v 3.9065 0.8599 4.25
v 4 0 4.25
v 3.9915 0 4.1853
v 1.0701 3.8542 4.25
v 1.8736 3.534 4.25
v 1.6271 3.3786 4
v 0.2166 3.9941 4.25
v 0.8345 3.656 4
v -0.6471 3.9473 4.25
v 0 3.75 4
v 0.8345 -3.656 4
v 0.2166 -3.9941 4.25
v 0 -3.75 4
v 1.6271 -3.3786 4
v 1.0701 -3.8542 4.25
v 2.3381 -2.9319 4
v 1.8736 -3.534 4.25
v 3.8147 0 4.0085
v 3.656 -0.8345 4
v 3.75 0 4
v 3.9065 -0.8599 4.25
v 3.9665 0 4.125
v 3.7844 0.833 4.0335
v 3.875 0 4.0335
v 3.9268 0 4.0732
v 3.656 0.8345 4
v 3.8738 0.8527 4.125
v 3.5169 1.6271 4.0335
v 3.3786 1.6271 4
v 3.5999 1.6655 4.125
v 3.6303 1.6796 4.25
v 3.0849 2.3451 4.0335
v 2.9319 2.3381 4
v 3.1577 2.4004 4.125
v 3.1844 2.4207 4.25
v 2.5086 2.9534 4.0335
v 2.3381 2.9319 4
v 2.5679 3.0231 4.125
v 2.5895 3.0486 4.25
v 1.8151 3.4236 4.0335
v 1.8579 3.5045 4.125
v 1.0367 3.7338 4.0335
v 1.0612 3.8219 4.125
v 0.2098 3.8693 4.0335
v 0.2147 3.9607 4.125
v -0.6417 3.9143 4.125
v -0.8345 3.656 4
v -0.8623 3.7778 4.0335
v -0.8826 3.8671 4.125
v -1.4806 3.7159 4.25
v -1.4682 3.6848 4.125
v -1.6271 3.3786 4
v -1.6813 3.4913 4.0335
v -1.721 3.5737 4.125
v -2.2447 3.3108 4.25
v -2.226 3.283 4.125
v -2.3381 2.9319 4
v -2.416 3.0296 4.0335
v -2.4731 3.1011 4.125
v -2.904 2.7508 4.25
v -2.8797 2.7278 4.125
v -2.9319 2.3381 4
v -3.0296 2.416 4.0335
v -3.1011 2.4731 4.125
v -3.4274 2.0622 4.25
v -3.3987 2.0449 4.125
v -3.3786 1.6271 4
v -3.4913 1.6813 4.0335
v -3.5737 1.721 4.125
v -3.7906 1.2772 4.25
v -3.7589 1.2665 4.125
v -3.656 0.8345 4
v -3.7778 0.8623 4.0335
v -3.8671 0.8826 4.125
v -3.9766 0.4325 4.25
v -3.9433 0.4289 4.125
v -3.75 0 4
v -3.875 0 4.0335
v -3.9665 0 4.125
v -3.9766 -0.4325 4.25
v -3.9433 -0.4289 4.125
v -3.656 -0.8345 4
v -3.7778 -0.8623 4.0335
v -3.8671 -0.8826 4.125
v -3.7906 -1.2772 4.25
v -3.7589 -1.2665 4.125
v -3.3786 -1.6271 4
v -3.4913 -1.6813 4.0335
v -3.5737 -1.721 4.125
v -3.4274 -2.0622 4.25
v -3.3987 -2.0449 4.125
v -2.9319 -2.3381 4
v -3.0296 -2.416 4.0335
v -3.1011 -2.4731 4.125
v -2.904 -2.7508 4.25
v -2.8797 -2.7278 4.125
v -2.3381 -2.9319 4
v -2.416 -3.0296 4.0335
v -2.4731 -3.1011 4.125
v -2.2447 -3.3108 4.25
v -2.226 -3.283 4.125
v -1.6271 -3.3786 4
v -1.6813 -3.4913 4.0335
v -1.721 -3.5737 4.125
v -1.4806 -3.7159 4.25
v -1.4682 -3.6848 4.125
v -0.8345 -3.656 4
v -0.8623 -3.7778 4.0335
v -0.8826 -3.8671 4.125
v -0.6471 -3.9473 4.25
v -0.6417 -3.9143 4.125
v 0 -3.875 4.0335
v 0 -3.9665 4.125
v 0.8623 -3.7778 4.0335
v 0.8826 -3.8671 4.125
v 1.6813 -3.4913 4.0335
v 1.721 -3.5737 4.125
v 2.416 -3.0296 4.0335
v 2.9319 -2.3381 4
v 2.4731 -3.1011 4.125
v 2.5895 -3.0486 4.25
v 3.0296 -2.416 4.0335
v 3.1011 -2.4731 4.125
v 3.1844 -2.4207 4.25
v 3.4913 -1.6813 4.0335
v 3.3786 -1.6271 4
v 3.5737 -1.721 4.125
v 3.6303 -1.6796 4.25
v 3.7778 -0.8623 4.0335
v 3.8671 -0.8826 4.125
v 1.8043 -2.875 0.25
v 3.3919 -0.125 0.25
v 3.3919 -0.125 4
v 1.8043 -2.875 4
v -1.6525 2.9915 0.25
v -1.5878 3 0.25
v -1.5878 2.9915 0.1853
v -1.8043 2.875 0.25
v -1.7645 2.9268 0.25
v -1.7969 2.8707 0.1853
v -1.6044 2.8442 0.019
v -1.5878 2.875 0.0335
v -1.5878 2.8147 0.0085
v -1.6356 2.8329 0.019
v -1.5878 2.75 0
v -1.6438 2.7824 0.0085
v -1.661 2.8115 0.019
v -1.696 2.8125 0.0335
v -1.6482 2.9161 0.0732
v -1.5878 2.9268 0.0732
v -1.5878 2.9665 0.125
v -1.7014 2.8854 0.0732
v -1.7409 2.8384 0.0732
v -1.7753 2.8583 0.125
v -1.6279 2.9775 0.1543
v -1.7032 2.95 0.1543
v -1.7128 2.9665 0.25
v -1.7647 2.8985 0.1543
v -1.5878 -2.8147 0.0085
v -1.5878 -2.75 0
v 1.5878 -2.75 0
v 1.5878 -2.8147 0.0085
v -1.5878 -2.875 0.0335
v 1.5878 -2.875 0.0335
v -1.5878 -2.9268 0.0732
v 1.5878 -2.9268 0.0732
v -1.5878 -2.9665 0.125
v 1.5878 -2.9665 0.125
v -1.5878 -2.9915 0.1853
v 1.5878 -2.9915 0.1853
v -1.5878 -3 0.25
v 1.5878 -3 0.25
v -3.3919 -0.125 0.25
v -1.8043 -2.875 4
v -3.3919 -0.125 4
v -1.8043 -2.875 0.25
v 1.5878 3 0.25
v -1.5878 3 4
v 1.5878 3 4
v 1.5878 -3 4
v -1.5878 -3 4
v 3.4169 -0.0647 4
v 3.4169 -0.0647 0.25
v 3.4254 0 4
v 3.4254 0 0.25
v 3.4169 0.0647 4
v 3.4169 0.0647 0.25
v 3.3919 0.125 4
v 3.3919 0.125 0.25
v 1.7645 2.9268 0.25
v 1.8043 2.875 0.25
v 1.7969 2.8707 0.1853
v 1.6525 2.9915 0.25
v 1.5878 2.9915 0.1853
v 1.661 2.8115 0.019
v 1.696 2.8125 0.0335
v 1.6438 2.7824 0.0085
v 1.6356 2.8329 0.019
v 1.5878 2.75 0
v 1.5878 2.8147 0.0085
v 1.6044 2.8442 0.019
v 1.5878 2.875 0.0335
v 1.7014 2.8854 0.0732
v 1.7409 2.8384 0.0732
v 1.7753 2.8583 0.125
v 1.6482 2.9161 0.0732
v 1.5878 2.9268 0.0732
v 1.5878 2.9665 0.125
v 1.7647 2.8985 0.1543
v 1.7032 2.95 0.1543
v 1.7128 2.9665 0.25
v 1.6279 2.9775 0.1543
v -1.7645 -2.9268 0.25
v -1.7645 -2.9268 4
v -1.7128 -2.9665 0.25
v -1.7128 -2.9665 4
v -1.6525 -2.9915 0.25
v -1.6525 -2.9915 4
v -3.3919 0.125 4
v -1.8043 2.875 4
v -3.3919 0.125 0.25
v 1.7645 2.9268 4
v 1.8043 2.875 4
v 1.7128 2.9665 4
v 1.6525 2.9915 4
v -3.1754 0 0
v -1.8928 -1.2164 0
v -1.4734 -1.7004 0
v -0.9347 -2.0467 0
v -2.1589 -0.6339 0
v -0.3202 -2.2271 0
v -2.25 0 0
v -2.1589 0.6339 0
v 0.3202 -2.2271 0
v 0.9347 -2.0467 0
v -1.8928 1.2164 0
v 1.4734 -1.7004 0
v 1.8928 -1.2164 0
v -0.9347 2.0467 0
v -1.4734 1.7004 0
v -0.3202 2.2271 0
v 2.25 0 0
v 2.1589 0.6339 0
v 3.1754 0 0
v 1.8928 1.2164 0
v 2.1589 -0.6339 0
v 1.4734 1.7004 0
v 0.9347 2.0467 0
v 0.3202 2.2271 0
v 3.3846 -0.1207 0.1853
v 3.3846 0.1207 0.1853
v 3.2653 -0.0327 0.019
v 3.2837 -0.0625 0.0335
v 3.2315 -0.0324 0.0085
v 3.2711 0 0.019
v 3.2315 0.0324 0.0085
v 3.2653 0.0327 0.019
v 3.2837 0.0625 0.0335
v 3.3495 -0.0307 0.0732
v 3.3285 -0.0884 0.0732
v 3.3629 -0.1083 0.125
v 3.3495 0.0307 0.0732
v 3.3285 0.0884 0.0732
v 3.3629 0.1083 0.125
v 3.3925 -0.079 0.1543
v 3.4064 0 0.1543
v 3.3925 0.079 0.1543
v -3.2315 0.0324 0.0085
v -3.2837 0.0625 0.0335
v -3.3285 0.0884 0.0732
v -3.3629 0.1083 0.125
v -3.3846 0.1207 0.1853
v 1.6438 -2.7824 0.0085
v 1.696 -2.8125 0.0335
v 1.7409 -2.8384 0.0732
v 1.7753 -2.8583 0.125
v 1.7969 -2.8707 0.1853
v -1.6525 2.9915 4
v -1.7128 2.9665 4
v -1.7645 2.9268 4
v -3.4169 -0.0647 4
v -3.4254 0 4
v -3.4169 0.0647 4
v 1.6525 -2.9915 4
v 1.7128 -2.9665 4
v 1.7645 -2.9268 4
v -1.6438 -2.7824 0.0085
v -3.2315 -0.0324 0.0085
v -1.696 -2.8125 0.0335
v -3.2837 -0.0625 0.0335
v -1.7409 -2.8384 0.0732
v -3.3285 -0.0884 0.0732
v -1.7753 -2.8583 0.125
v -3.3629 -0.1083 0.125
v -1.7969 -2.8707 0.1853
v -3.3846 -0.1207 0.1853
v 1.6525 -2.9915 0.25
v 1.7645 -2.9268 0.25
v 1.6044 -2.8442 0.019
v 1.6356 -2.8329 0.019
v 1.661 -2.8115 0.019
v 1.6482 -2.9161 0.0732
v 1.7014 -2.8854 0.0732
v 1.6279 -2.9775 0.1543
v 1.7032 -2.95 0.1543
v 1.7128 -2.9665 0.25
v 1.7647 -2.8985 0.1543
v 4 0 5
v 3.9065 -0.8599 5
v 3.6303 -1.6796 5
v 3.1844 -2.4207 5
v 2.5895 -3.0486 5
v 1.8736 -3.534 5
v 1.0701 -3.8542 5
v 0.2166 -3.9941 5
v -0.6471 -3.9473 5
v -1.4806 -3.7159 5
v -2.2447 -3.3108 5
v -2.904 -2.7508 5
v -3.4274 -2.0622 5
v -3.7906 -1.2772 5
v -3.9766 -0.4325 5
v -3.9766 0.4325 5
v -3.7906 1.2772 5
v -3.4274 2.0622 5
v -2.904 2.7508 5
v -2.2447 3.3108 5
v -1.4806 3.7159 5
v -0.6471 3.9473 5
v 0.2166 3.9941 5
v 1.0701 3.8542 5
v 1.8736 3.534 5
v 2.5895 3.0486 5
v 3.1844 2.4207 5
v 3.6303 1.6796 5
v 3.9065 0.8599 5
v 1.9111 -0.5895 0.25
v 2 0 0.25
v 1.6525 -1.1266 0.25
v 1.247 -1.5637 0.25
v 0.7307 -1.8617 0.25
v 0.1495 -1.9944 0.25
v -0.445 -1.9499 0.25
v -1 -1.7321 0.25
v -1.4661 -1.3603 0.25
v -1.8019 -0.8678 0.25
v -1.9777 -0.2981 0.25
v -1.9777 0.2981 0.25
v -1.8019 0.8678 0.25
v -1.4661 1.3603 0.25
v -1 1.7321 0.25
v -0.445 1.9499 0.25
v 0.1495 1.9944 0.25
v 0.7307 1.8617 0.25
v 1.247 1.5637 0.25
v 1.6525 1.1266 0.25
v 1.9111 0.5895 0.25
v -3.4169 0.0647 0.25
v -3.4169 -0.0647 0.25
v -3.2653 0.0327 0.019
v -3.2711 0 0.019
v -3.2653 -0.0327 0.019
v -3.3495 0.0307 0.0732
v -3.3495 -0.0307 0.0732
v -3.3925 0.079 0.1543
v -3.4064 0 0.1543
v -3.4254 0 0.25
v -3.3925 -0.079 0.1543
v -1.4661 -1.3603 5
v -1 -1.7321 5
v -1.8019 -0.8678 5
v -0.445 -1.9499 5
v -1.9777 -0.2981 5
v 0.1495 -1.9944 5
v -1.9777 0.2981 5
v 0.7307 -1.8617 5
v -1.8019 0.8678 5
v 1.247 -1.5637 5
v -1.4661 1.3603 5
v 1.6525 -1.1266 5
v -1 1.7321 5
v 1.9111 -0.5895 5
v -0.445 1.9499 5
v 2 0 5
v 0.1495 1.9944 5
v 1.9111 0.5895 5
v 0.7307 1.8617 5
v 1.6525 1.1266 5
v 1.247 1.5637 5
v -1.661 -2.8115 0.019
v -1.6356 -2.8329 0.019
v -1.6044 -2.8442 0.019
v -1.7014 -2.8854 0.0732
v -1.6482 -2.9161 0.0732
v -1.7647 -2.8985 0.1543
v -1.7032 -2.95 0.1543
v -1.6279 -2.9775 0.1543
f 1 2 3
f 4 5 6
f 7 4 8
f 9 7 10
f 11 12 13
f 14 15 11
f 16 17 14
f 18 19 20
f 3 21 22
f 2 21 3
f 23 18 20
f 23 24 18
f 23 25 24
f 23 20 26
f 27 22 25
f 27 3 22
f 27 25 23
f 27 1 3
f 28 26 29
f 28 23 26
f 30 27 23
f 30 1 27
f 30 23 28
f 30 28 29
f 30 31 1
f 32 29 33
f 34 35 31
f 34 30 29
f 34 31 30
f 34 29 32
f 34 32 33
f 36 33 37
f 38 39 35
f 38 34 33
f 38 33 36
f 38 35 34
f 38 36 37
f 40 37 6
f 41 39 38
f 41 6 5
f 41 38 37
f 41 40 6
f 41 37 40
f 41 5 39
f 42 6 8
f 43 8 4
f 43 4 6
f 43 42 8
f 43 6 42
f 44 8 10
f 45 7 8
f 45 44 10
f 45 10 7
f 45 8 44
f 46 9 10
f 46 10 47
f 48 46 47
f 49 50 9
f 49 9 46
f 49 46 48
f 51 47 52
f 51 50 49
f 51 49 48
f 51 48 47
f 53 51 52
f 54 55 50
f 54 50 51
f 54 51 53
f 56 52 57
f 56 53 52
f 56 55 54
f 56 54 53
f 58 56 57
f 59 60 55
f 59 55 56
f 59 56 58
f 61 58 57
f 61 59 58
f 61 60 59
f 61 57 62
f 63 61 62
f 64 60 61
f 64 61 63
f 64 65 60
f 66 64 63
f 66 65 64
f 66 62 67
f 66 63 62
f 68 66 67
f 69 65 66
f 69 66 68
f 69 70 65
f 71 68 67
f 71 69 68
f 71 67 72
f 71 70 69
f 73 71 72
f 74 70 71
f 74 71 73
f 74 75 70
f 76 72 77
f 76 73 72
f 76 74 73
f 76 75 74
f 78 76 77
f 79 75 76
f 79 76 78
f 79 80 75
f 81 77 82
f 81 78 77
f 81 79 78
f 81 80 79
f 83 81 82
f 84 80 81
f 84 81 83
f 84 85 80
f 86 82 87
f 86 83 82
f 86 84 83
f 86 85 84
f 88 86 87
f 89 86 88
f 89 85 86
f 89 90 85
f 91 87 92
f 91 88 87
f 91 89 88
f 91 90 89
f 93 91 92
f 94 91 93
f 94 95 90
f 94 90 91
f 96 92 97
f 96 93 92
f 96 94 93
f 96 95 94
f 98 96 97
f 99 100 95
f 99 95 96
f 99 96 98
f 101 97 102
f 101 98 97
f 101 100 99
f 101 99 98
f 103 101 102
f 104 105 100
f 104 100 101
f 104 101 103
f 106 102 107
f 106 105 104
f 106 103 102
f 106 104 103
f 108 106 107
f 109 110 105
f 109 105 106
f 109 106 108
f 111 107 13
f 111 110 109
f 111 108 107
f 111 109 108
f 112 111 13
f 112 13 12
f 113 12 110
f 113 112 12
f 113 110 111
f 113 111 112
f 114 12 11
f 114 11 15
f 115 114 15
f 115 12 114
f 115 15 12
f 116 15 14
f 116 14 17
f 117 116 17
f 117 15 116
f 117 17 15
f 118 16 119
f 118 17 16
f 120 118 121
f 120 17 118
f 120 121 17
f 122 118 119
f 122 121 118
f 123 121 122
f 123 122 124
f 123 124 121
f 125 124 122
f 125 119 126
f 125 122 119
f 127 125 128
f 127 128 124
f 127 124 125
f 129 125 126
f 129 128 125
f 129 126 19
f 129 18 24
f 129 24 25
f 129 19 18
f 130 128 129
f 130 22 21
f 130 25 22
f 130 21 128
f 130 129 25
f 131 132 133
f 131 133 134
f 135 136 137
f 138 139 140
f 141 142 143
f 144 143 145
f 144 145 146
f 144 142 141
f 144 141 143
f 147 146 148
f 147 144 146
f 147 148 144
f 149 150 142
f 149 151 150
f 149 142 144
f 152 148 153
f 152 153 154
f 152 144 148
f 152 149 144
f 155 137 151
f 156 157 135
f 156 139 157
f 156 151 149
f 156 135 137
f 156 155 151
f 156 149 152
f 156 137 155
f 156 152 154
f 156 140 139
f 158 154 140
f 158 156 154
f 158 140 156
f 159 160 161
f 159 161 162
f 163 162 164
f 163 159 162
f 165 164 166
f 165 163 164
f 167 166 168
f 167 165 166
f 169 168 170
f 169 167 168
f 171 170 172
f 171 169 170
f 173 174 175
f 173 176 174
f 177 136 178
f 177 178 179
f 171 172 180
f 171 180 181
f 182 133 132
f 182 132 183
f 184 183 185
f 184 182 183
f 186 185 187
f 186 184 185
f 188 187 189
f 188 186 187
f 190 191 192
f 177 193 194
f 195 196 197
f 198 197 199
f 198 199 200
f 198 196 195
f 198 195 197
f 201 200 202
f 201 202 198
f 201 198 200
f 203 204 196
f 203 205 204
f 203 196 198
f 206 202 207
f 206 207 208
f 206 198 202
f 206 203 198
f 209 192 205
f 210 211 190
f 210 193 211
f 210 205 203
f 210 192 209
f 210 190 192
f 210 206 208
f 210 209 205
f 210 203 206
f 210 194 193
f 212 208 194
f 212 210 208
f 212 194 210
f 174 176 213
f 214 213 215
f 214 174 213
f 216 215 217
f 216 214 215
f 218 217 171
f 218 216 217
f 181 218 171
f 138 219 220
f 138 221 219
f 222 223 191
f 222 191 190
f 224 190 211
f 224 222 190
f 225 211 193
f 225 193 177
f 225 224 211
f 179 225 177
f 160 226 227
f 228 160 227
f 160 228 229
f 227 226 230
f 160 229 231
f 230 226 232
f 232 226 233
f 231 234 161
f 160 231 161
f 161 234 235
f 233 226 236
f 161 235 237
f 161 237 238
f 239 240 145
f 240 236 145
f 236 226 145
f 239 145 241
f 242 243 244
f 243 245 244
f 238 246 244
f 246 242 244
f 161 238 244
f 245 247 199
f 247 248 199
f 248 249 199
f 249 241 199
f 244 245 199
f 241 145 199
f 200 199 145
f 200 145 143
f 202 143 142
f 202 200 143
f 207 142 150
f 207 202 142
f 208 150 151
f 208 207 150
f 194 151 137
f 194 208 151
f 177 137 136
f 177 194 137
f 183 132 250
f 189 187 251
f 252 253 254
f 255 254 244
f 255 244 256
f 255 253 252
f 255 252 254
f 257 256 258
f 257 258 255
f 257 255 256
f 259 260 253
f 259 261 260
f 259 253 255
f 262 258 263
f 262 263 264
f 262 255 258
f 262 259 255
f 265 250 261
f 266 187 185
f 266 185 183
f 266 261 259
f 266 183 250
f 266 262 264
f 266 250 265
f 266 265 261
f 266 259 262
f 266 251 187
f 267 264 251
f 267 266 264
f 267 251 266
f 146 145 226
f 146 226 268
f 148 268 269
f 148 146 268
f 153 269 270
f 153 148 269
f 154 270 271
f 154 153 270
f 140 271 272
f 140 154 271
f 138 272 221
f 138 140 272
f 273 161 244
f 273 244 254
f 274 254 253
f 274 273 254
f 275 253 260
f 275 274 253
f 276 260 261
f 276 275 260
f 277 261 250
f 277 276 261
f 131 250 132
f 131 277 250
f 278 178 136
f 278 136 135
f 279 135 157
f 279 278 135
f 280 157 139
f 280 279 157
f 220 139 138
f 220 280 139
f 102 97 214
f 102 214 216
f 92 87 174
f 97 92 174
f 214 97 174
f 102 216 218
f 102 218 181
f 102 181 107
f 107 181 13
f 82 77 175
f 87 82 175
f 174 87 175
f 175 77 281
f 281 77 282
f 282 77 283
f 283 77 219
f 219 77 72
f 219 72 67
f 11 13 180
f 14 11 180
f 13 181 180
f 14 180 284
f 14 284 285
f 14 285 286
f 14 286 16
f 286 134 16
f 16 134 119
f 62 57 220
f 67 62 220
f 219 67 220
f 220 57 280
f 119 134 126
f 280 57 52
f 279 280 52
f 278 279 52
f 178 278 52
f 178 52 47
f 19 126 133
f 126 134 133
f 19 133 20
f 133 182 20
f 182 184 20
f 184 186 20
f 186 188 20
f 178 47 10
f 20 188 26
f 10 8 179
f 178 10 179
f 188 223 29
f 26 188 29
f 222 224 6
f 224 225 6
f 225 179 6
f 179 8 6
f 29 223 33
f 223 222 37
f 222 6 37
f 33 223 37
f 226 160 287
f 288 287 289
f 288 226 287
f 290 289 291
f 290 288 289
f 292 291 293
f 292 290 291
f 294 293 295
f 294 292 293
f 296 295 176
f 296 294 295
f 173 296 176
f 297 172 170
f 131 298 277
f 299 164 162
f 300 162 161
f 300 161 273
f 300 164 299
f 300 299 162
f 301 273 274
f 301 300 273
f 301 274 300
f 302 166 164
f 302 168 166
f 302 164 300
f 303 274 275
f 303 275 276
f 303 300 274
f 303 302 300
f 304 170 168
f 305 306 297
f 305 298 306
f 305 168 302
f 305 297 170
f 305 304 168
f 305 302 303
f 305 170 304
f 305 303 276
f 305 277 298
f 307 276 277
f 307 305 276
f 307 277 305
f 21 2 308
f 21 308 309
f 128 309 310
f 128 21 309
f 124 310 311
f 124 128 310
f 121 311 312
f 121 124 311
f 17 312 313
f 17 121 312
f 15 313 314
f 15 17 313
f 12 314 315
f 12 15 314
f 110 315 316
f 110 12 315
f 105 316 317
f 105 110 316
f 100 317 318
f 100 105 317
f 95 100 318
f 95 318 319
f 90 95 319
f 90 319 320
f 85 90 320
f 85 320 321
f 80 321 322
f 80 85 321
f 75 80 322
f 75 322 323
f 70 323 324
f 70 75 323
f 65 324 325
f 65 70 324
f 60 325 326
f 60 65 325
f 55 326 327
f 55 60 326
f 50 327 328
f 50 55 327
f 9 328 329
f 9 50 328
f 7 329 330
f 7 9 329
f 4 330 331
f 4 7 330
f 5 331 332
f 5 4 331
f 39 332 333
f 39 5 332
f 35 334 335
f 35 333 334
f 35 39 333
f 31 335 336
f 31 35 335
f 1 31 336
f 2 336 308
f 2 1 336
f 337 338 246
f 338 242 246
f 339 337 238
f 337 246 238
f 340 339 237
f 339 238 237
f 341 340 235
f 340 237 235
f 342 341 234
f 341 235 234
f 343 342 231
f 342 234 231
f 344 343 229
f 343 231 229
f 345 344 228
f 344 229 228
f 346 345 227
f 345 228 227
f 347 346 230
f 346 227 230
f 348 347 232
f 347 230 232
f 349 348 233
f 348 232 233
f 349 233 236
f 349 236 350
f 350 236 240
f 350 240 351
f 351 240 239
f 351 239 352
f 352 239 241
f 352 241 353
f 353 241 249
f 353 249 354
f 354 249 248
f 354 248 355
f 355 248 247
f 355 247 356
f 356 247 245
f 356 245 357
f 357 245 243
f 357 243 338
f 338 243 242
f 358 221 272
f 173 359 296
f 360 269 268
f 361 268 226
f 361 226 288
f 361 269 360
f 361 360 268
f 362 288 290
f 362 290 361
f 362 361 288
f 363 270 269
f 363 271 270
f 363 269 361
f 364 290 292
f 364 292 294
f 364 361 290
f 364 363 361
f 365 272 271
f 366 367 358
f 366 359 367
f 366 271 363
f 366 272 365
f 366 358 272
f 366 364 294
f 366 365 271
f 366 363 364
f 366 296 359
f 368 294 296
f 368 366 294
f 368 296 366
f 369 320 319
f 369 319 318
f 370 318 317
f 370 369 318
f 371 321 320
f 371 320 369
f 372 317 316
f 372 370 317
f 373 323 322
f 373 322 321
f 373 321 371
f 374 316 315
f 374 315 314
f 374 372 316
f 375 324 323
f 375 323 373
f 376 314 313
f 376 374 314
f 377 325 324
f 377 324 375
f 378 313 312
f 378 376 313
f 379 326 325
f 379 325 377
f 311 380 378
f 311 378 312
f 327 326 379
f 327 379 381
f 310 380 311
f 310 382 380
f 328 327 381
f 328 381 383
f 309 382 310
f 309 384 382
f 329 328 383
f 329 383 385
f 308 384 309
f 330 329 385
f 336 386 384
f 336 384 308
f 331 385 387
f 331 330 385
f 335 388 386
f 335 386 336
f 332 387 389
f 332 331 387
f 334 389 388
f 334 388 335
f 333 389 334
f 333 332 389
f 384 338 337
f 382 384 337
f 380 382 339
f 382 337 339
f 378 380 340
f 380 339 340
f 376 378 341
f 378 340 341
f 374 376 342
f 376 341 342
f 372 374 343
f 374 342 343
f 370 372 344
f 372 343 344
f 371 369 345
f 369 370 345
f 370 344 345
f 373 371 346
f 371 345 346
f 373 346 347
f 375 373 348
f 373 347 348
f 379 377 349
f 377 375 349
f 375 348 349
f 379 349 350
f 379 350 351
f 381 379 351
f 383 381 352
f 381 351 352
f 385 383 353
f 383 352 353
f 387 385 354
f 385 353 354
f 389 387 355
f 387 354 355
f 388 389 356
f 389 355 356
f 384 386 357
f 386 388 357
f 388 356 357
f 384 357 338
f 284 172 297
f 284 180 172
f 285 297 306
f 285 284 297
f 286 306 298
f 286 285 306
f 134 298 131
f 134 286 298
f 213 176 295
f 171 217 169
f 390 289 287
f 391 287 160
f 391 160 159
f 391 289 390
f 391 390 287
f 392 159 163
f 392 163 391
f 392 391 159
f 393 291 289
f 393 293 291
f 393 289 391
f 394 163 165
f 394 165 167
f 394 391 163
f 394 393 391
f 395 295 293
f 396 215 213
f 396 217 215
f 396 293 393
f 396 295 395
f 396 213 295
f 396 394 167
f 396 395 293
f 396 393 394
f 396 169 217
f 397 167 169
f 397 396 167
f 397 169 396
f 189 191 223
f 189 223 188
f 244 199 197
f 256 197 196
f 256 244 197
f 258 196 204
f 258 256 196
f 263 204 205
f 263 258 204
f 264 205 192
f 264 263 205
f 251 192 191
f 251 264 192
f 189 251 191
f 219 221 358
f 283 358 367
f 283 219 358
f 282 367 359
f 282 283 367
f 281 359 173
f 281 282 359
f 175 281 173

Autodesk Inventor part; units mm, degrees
ref_plane "YZ Plane" through (0, 0, 0) normal (1, 0, 0) x (0, 1, 0)
ref_plane "XZ Plane" through (0, 0, 0) normal (0, 1, 0) x (-1, 0, 0)
ref_plane "XY Plane" through (0, 0, 0) normal (0, 0, 1) x (1, 0, 0)
sketch "草图1" plane through (0, 0, 0) normal (0, 0, 1) x (1, 0, 0)
  circle A0 centre (0, 0) radius 2
  line L0 (1.7321, -3) -> (-1.7321, -3)
  line L1 (-1.7321, -3) -> (-3.4641, 0)
  line L2 (-3.4641, 0) -> (-1.7321, 3)
  line L3 (-1.7321, 3) -> (1.7321, 3)
  line L4 (1.7321, 3) -> (3.4641, 0)
  line L5 (3.4641, 0) -> (1.7321, -3)
  line L6 (0, 0) -> (0, 1.0765)
  point P0 (0, 3)
  dimension "d0" = 4
  dimension "d1" = 1.0765
  dimension "d2" = 6
extrude "拉伸1" add sketch "草图1" along normal blind 4
sketch "草图2" plane through (0, 0, 4) normal (0, 0, 1) x (1, 0, 0)
  circle A0 centre (0, 0) radius 4
  circle A1 centre (0, 0) radius 2
  dimension "d5" = 8
  dimension "d6" = 4
extrude "拉伸2" add sketch "草图2" along normal blind 1
thread "螺纹1" size "M4x0.7" class "6H" standard "ANSI Metric M Profile" full length
fillet "圆角1" radius 0.25 13 edges at (-4, 0, 4) (1.7321, 3, 2) (2.5981, 1.5, 0) (0, 3, 0) (-2.5981, 1.5, 0) (-2.5981, -1.5, 0) (0, -3, 0) (2.5981, -1.5, 0) (1.7321, -3, 2) (3.4641, 0, 2) (-1.7321, -3, 2) (-3.4641, 0, 2) (-1.7321, 3, 2)
chamfer "倒角1" distance 0.25 angle 45 1 edges at (-2, 0, 0)
properties part number "刀轴端盖螺帽"
